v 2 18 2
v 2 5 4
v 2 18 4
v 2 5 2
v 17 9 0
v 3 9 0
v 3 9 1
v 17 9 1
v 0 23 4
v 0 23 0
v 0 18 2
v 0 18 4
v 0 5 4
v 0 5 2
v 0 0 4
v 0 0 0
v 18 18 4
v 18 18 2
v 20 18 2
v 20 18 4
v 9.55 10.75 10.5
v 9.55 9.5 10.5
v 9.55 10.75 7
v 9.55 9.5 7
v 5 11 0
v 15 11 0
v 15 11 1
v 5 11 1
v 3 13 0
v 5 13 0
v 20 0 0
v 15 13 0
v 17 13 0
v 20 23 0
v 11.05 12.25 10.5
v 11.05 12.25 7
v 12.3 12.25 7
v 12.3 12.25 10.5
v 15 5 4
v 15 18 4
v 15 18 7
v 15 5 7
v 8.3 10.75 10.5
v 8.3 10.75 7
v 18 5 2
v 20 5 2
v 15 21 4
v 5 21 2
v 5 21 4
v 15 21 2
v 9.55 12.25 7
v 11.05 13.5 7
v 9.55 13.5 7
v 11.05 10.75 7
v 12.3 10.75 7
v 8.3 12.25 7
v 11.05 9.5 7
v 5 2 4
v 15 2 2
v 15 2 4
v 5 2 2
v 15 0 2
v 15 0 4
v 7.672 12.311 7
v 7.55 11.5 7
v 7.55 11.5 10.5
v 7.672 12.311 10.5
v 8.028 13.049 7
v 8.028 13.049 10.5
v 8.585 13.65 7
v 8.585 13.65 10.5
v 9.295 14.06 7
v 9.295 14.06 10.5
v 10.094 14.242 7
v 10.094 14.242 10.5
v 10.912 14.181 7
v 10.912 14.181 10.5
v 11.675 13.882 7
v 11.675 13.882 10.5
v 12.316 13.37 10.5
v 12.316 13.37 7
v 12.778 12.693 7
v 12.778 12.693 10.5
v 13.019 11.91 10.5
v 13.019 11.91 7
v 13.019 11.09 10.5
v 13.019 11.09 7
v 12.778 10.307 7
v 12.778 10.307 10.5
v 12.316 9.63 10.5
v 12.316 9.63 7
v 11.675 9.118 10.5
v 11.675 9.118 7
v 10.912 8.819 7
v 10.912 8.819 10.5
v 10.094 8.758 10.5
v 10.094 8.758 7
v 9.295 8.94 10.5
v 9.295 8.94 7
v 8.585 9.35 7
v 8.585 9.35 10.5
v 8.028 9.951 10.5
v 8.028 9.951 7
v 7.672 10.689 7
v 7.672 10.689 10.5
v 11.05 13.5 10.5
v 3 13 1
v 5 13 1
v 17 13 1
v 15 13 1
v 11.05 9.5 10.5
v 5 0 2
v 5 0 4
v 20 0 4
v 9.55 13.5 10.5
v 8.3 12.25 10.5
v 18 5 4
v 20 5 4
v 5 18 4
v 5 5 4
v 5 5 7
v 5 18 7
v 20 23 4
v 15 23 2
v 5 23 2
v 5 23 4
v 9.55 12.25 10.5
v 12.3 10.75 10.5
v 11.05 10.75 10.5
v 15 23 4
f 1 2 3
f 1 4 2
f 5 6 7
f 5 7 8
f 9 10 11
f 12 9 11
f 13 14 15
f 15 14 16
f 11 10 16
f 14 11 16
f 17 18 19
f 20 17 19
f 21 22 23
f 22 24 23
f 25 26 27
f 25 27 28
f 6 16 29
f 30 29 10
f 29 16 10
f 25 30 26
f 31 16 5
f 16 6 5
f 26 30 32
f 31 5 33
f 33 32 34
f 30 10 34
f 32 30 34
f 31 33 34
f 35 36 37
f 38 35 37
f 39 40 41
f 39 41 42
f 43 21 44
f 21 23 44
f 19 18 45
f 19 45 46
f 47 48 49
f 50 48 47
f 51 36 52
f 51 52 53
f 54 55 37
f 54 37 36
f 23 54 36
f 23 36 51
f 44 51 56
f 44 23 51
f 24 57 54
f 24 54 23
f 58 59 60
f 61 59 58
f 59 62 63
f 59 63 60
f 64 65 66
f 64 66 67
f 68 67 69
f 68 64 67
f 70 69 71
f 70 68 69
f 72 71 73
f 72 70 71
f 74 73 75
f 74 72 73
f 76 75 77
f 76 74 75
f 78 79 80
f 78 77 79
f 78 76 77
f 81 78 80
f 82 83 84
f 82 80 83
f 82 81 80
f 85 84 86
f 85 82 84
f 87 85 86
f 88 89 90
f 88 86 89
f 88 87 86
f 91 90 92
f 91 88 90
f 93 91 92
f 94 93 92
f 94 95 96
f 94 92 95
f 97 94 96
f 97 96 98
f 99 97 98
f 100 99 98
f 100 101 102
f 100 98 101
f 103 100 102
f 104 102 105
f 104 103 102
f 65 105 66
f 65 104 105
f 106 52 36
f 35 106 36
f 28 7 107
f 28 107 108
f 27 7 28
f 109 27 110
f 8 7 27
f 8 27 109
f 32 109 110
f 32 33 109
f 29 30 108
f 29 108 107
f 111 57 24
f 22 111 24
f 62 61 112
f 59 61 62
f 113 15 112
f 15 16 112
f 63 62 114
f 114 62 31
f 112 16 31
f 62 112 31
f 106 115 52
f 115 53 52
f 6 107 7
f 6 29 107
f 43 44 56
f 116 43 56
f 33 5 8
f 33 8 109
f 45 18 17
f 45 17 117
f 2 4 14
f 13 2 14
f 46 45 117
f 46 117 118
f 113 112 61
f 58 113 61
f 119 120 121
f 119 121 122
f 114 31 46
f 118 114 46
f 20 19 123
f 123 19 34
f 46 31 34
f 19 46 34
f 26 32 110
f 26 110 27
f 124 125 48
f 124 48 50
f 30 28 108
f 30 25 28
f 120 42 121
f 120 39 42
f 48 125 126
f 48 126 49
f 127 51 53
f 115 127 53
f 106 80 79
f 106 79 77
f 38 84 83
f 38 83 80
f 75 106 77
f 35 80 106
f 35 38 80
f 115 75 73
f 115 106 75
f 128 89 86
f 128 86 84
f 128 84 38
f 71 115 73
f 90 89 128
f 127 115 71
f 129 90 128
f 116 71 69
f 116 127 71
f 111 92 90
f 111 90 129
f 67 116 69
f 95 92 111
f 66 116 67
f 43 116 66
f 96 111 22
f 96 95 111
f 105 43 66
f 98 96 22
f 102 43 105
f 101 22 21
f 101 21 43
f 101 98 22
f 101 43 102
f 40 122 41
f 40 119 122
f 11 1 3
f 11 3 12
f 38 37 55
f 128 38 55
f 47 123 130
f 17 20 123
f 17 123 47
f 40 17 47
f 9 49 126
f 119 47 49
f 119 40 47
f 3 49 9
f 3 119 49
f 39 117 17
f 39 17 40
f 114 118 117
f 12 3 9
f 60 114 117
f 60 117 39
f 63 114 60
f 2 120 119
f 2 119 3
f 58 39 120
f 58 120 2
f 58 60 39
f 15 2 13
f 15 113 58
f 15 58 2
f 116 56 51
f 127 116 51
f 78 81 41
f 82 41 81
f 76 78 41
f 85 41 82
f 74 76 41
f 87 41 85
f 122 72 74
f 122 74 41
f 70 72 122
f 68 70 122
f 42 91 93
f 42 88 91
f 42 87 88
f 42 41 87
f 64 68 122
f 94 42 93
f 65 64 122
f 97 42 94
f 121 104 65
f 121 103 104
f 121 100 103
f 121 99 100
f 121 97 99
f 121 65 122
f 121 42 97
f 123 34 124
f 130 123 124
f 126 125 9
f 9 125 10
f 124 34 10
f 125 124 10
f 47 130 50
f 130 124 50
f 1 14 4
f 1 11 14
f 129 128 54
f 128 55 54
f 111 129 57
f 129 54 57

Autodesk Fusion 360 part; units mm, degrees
sketch "スケッチ1" plane through (0, 0, 0) normal (0, 0, 1) x (1, 0, 0)
  line L0 (0, 0) -> (20, 0)
  line L1 (20, 0) -> (20, 23)
  line L2 (20, 23) -> (0, 23)
  line L3 (0, 23) -> (0, 0)
  dimension "d1" = 20
  dimension "d2" = 23
extrude "押し出し1" add sketch "スケッチ1" along normal blind 2
sketch "スケッチ2" plane through (0, 0, 2) normal (0, 0, 1) x (-1, 0, 0)
  line L0 (0, -23) -> (0, 0)
  line L1 (0, 0) -> (-20, 0)
  line L2 (-20, 0) -> (-20, -23)
  line L3 (-20, -23) -> (0, -23)
  line L4 (0, -23) -> (-5, -23)
  line L5 (-5, -23) -> (-5, -18)
  line L6 (-5, -18) -> (0, -18)
  line L7 (0, -18) -> (0, -23)
  line L8 (-20, -23) -> (-15, -23)
  line L9 (-15, -23) -> (-15, -18)
  line L10 (-15, -18) -> (-20, -18)
  line L11 (-20, -18) -> (-20, -23)
  line L12 (0, 0) -> (-5, 0)
  line L13 (-5, 0) -> (-5, -5)
  line L14 (-5, -5) -> (0, -5)
  line L15 (0, -5) -> (0, 0)
  line L16 (-20, 0) -> (-15, 0)
  line L17 (-15, 0) -> (-15, -5)
  line L18 (-15, -5) -> (-20, -5)
  line L19 (-20, -5) -> (-20, 0)
  line L20 (-2, -21) -> (-18, -21)
  line L21 (-18, -21) -> (-18, -2)
  line L22 (-18, -2) -> (-2, -2)
  line L23 (-2, -2) -> (-2, -21)
  dimension "d5" = 5
  dimension "d6" = 5
  dimension "d7" = 5
  dimension "d8" = 5
  dimension "d9" = 5
  dimension "d10" = 5
  dimension "d11" = 5
  dimension "d12" = 5
extrude "押し出し2" add sketch "スケッチ2" along normal blind 2 contours L0 L3 L4 L5 L6 L7 L20 L23 | L0 L1 L12 L13 L14 L15 L22 L23 | L5 L6 L20 L23 | L5 L6 L9 L10 L13 L14 L17 L18 L20 L21 L22 L23 | L2 L3 L8 L9 L10 L11 L20 L21 | L13 L14 L22 L23 | L9 L10 L20 L21 | L1 L2 L16 L17 L18 L19 L21 L22 | L17 L18 L21 L22
sketch "スケッチ3" plane through (0, 0, 4) normal (0, 0, 1) x (-1, 0, 0)
  line L0 (-18, -18) -> (-20, -18)
  line L1 (-20, -18) -> (-20, -23)
  line L2 (-20, -23) -> (-15, -23)
  line L3 (-15, -23) -> (-15, -21)
  line L4 (-15, -21) -> (-5, -21)
  line L5 (-5, -21) -> (-5, -23)
  line L6 (-5, -23) -> (0, -23)
  line L7 (0, -23) -> (0, -18)
  line L8 (0, -18) -> (-2, -18)
  line L9 (-2, -18) -> (-2, -5)
  line L10 (-2, -5) -> (0, -5)
  line L11 (0, -5) -> (0, 0)
  line L12 (0, 0) -> (-5, 0)
  line L13 (-5, 0) -> (-5, -2)
  line L14 (-5, -2) -> (-15, -2)
  line L15 (-15, -2) -> (-15, 0)
  line L16 (-15, 0) -> (-20, 0)
  line L17 (-20, 0) -> (-20, -5)
  line L18 (-20, -5) -> (-18, -5)
  line L19 (-18, -5) -> (-18, -18)
  line L20 (-5, -18) -> (-15, -18)
  line L21 (-15, -18) -> (-15, -5)
  line L22 (-15, -5) -> (-5, -5)
  line L23 (-5, -5) -> (-5, -18)
extrude "押し出し3" add sketch "スケッチ3" along normal blind 3 contours L20 L21 L22 L23
sketch "スケッチ4" plane through (0, 0, 7) normal (0, 0, 1) x (-1, 0, 0)
  line L0 (-5, -5) -> (-15, -5)
  line L1 (-15, -5) -> (-15, -18)
  line L2 (-15, -18) -> (-5, -18)
  line L3 (-5, -18) -> (-5, -5)
  line L4 (-9.55, -13.5) -> (-11.05, -13.5)
  line L5 (-11.05, -13.5) -> (-11.05, -9.5)
  line L6 (-11.05, -9.5) -> (-9.55, -9.5)
  line L7 (-9.55, -9.5) -> (-9.55, -13.5)
  line L8 (-8.3, -12.25) -> (-12.3, -12.25)
  line L9 (-12.3, -12.25) -> (-12.3, -10.75)
  line L10 (-12.3, -10.75) -> (-8.3, -10.75)
  line L11 (-8.3, -10.75) -> (-8.3, -12.25)
  circle A0 centre (-10.3, -11.5) radius 2.75
  dimension "d17" = 13
  dimension "d18" = 1.5
  dimension "d19" = 4
  dimension "d20" = 4
  dimension "d21" = 1.5
  dimension "d22" = 5.5
extrude "押し出し4" add sketch "スケッチ4" along normal blind 3.5 contours A0
sketch "スケッチ7" plane through (0, 0, 0) normal (0, 0, -1) x (1, 0, 0)
  line L0 (0, 0) -> (0, -23)
  line L1 (0, -23) -> (20, -23)
  line L2 (20, -23) -> (20, 0)
  line L3 (20, 0) -> (0, 0)
  line L4 (17, -9) -> (17, -13)
  line L5 (15, -13) -> (15, -9)
  line L6 (15, -9) -> (17, -9)
  line L7 (17, -13) -> (15, -13)
  line L8 (5, -9) -> (15, -9)
  line L9 (15, -11) -> (5, -11)
  line L10 (5, -11) -> (5, -9)
  line L11 (15, -9) -> (15, -11)
  line L12 (5, -13) -> (3, -13)
  line L13 (3, -13) -> (3, -9)
  line L14 (3, -9) -> (5, -9)
  line L15 (5, -9) -> (5, -13)
extrude "押し出し7" cut sketch "スケッチ7" against normal blind 1 contours L4 L5 L6 L7 L11 | L5 L8 L9 L10 L11 L15 | L10 L12 L13 L14 L15
